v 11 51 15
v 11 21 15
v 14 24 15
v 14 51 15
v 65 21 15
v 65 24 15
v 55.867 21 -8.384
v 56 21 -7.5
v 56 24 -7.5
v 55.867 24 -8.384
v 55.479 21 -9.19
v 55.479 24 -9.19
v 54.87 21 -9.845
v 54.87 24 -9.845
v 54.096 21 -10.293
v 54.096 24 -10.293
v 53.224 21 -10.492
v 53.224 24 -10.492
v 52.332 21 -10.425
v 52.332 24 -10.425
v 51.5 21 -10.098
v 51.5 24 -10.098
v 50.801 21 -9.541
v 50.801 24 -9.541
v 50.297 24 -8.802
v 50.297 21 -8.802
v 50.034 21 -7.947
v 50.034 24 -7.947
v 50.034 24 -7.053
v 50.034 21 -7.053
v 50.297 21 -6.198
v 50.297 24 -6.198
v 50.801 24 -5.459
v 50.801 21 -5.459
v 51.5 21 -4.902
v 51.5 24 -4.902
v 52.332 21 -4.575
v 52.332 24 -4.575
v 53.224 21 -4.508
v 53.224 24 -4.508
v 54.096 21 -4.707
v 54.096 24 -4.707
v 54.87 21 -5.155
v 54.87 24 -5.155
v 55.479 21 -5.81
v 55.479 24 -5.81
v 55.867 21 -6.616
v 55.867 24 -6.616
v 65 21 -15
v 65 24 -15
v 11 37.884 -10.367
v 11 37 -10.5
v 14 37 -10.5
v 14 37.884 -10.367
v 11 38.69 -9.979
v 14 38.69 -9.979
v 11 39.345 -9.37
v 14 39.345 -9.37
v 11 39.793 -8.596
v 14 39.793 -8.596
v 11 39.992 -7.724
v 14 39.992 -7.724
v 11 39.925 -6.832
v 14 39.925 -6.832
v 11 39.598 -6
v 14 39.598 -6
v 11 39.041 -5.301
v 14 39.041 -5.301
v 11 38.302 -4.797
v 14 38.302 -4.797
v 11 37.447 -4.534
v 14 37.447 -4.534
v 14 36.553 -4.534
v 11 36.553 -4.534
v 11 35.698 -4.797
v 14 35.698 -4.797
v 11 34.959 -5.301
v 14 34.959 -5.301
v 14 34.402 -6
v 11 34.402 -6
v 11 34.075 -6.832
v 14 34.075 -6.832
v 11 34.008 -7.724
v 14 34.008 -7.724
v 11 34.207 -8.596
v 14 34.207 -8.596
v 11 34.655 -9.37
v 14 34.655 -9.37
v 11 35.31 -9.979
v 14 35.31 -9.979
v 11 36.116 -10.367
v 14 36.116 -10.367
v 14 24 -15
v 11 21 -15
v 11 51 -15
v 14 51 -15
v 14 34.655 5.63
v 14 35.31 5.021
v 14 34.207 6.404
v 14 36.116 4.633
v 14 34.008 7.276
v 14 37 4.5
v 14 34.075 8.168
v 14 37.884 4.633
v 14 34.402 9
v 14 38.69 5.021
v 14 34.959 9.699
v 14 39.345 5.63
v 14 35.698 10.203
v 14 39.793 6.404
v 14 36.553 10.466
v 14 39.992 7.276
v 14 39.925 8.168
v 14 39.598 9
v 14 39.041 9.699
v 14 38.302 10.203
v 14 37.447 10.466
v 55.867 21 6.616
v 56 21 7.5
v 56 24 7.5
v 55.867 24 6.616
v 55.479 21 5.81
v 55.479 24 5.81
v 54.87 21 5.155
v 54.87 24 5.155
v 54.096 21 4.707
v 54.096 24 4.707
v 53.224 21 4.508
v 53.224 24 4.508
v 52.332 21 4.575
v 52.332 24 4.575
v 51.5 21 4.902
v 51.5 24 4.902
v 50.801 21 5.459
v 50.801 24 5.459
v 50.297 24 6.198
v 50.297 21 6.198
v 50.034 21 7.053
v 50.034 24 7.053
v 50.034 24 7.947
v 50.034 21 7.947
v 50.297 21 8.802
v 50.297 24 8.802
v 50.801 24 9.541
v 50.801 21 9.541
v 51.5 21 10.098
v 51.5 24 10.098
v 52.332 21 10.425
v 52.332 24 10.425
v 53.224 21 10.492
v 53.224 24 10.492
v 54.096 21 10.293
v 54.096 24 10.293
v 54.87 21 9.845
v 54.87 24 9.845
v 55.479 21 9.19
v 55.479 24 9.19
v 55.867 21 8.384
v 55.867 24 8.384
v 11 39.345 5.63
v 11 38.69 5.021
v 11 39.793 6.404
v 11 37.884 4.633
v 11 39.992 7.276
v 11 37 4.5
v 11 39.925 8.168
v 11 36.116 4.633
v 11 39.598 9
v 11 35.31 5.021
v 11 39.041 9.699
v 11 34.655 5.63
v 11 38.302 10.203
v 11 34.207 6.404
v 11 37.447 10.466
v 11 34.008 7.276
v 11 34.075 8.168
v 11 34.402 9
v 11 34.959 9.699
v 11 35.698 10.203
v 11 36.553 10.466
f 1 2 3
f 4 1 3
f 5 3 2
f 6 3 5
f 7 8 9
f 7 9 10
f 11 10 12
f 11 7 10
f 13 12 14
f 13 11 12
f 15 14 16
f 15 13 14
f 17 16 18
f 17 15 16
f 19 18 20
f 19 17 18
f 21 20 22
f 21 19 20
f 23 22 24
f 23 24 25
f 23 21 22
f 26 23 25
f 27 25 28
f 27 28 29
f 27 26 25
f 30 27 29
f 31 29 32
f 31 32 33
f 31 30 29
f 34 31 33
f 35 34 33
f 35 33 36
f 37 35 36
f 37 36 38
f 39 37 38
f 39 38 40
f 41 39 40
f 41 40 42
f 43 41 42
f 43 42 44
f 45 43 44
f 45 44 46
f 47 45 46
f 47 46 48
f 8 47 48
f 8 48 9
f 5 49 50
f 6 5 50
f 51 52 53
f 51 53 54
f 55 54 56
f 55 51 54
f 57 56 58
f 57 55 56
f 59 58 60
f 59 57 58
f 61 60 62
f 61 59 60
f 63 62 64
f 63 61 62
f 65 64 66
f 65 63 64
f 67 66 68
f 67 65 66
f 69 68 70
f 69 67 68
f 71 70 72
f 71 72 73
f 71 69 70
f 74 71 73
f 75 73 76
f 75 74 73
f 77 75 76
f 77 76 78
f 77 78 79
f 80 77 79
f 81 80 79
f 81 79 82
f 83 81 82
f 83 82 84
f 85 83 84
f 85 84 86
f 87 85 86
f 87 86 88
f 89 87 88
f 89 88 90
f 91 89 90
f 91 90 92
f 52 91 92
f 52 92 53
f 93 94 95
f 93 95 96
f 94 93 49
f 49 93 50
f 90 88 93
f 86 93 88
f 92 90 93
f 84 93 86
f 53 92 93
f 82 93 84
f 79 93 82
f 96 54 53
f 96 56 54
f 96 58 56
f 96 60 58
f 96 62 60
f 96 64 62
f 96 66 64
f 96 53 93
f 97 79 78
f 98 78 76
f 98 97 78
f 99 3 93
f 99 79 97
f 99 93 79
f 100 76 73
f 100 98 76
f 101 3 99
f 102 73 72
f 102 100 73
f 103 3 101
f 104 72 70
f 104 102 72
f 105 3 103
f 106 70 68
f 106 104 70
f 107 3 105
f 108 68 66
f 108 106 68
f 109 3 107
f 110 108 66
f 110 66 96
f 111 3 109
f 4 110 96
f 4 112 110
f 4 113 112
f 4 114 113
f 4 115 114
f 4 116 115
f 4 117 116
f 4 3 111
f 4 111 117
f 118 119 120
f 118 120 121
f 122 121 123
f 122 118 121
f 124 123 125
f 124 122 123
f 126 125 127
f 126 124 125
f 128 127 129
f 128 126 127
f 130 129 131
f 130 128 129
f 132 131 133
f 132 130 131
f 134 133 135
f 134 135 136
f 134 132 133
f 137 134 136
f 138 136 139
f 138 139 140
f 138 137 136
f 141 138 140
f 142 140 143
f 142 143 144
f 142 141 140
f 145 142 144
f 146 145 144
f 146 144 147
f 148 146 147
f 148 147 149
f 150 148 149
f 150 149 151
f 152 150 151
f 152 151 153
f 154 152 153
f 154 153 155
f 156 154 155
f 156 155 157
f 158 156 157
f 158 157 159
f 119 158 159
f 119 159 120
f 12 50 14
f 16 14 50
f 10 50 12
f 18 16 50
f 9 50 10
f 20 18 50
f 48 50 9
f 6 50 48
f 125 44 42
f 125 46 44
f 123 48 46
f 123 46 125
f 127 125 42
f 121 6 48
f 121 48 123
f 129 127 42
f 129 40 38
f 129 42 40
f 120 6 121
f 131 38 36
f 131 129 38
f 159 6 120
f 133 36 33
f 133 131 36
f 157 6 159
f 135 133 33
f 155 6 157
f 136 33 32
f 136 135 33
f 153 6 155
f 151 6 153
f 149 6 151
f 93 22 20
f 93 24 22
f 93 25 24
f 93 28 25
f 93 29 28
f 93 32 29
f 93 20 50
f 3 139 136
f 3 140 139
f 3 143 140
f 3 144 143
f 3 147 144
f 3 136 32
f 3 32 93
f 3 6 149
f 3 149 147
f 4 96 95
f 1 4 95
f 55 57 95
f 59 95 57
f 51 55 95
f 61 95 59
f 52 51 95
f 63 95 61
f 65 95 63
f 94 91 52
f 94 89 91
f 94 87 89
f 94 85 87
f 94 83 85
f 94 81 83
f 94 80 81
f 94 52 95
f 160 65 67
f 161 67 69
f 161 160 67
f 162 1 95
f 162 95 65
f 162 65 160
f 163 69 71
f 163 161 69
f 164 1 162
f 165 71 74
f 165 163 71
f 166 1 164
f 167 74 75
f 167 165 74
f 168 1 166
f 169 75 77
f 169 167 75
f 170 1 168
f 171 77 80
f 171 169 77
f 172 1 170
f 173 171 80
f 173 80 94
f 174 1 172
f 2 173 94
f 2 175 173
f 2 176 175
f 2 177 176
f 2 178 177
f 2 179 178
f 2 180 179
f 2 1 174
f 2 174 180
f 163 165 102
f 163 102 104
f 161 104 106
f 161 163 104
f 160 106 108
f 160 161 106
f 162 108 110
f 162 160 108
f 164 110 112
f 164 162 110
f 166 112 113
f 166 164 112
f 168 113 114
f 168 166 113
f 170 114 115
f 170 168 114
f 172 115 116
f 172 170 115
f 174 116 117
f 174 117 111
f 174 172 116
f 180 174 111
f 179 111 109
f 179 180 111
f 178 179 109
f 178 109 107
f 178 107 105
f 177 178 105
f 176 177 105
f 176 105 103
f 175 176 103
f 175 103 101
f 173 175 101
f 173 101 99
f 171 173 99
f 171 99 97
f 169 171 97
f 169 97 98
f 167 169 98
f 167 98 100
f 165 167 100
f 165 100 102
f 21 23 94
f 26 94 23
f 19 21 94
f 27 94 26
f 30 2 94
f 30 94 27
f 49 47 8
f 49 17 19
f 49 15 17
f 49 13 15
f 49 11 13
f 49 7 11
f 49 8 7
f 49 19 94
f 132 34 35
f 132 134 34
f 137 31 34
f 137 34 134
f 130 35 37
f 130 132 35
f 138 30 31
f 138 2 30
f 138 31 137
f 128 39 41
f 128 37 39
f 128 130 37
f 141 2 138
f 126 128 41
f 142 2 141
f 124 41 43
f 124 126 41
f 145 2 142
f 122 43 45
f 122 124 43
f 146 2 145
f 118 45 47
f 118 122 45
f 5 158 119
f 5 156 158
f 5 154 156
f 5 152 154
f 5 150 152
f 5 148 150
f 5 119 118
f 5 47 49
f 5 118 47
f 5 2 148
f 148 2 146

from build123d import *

# Parameters (mm, degrees)
AUFSATZ_LINEAR_AUSTRAGEN1_DEPTH      = 15
AUFSATZ_LINEAR_AUSTRAGEN1_DEPTH_BACK = 15
SKIZZE5_R                            = 3
SCHNITT_LINEAR_AUSTRAGEN1_DEPTH      = 24
SKIZZE7_R                            = 3
SCHNITT_LINEAR_AUSTRAGEN2_DEPTH      = 14


with BuildPart() as part:
    # Skizze2 → Aufsatz-Linear austragen1 (new body, two sides)
    with BuildSketch(Plane.XY) as aufsatz_linear_austragen1_sk:
        Polygon((14, 51), (11, 51), (11, 21), (65, 21), (65, 24), (14, 24), align=None)
    extrude(amount=AUFSATZ_LINEAR_AUSTRAGEN1_DEPTH)
    extrude(aufsatz_linear_austragen1_sk.sketch, amount=-AUFSATZ_LINEAR_AUSTRAGEN1_DEPTH_BACK)

    # Skizze5 → Schnitt-Linear austragen1 (cut)
    with BuildSketch(Plane(origin=(0, 0, 0), x_dir=(1, 0, 0), z_dir=(0, 1, 0))):
        with Locations((53, -7.5)):
            Circle(SKIZZE5_R)
        with Locations((53, 7.5)):
            Circle(SKIZZE5_R)
    extrude(amount=SCHNITT_LINEAR_AUSTRAGEN1_DEPTH, mode=Mode.SUBTRACT)

    # Skizze7 → Schnitt-Linear austragen2 (cut)
    with BuildSketch(Plane(origin=(0, 0, 0), x_dir=(0, 0, -1), z_dir=(1, 0, 0))):
        with Locations((7.5, 37)):
            Circle(SKIZZE7_R)
        with Locations((-7.5, 37)):
            Circle(SKIZZE7_R)
    extrude(amount=SCHNITT_LINEAR_AUSTRAGEN2_DEPTH, mode=Mode.SUBTRACT)


solid = part.part
